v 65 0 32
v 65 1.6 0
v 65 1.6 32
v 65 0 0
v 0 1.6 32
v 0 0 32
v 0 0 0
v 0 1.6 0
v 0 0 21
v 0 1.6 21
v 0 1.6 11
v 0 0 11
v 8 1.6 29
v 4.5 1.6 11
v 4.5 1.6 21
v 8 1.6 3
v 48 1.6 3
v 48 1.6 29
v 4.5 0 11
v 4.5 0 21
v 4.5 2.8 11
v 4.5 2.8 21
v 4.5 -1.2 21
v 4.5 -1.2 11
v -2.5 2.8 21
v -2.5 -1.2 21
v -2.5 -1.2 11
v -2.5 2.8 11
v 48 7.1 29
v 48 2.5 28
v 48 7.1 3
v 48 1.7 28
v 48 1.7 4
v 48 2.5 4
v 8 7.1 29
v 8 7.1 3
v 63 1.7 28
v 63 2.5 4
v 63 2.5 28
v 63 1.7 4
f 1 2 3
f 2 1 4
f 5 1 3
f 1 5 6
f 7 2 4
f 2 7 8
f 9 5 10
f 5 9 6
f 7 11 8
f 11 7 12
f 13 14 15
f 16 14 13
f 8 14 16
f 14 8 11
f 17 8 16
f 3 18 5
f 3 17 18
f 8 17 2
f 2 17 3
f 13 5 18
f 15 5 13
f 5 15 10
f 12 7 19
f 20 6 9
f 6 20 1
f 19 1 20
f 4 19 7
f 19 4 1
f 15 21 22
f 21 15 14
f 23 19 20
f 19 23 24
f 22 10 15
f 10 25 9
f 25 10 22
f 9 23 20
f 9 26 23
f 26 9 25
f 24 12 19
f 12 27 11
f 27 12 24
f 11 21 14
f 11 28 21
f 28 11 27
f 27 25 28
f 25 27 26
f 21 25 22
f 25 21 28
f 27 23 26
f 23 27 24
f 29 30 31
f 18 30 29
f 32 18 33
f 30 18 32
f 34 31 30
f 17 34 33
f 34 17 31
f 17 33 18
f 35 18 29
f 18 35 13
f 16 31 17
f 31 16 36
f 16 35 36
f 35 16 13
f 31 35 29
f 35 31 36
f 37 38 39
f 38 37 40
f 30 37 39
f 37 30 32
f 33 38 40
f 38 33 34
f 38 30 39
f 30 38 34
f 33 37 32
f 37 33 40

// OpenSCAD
// HUB75 display case component: matrixportal_s3
include <../config/project_config.scad>

module matrixportal_s3_model() {
    color([0.10,0.24,0.38,1]) cube([esp_board_length,esp_board_thickness,esp_board_width]);
    color([0.65,0.67,0.70,1]) translate([-2.5,-1.2,esp_board_width/2-5]) cube([7,4,10]);
    color([0.12,0.12,0.12,1]) translate([8,esp_board_thickness,3]) cube([esp_board_length-25,5.5,esp_board_width-6]);
    // antenna zone on the outer right side
    color([0.82,0.65,0.22,1]) translate([esp_board_length-18,esp_board_thickness+0.1,4]) cube([16,0.8,esp_board_width-8]);
}

/* [Standalone preview] */
matrixportal_s3_model();
